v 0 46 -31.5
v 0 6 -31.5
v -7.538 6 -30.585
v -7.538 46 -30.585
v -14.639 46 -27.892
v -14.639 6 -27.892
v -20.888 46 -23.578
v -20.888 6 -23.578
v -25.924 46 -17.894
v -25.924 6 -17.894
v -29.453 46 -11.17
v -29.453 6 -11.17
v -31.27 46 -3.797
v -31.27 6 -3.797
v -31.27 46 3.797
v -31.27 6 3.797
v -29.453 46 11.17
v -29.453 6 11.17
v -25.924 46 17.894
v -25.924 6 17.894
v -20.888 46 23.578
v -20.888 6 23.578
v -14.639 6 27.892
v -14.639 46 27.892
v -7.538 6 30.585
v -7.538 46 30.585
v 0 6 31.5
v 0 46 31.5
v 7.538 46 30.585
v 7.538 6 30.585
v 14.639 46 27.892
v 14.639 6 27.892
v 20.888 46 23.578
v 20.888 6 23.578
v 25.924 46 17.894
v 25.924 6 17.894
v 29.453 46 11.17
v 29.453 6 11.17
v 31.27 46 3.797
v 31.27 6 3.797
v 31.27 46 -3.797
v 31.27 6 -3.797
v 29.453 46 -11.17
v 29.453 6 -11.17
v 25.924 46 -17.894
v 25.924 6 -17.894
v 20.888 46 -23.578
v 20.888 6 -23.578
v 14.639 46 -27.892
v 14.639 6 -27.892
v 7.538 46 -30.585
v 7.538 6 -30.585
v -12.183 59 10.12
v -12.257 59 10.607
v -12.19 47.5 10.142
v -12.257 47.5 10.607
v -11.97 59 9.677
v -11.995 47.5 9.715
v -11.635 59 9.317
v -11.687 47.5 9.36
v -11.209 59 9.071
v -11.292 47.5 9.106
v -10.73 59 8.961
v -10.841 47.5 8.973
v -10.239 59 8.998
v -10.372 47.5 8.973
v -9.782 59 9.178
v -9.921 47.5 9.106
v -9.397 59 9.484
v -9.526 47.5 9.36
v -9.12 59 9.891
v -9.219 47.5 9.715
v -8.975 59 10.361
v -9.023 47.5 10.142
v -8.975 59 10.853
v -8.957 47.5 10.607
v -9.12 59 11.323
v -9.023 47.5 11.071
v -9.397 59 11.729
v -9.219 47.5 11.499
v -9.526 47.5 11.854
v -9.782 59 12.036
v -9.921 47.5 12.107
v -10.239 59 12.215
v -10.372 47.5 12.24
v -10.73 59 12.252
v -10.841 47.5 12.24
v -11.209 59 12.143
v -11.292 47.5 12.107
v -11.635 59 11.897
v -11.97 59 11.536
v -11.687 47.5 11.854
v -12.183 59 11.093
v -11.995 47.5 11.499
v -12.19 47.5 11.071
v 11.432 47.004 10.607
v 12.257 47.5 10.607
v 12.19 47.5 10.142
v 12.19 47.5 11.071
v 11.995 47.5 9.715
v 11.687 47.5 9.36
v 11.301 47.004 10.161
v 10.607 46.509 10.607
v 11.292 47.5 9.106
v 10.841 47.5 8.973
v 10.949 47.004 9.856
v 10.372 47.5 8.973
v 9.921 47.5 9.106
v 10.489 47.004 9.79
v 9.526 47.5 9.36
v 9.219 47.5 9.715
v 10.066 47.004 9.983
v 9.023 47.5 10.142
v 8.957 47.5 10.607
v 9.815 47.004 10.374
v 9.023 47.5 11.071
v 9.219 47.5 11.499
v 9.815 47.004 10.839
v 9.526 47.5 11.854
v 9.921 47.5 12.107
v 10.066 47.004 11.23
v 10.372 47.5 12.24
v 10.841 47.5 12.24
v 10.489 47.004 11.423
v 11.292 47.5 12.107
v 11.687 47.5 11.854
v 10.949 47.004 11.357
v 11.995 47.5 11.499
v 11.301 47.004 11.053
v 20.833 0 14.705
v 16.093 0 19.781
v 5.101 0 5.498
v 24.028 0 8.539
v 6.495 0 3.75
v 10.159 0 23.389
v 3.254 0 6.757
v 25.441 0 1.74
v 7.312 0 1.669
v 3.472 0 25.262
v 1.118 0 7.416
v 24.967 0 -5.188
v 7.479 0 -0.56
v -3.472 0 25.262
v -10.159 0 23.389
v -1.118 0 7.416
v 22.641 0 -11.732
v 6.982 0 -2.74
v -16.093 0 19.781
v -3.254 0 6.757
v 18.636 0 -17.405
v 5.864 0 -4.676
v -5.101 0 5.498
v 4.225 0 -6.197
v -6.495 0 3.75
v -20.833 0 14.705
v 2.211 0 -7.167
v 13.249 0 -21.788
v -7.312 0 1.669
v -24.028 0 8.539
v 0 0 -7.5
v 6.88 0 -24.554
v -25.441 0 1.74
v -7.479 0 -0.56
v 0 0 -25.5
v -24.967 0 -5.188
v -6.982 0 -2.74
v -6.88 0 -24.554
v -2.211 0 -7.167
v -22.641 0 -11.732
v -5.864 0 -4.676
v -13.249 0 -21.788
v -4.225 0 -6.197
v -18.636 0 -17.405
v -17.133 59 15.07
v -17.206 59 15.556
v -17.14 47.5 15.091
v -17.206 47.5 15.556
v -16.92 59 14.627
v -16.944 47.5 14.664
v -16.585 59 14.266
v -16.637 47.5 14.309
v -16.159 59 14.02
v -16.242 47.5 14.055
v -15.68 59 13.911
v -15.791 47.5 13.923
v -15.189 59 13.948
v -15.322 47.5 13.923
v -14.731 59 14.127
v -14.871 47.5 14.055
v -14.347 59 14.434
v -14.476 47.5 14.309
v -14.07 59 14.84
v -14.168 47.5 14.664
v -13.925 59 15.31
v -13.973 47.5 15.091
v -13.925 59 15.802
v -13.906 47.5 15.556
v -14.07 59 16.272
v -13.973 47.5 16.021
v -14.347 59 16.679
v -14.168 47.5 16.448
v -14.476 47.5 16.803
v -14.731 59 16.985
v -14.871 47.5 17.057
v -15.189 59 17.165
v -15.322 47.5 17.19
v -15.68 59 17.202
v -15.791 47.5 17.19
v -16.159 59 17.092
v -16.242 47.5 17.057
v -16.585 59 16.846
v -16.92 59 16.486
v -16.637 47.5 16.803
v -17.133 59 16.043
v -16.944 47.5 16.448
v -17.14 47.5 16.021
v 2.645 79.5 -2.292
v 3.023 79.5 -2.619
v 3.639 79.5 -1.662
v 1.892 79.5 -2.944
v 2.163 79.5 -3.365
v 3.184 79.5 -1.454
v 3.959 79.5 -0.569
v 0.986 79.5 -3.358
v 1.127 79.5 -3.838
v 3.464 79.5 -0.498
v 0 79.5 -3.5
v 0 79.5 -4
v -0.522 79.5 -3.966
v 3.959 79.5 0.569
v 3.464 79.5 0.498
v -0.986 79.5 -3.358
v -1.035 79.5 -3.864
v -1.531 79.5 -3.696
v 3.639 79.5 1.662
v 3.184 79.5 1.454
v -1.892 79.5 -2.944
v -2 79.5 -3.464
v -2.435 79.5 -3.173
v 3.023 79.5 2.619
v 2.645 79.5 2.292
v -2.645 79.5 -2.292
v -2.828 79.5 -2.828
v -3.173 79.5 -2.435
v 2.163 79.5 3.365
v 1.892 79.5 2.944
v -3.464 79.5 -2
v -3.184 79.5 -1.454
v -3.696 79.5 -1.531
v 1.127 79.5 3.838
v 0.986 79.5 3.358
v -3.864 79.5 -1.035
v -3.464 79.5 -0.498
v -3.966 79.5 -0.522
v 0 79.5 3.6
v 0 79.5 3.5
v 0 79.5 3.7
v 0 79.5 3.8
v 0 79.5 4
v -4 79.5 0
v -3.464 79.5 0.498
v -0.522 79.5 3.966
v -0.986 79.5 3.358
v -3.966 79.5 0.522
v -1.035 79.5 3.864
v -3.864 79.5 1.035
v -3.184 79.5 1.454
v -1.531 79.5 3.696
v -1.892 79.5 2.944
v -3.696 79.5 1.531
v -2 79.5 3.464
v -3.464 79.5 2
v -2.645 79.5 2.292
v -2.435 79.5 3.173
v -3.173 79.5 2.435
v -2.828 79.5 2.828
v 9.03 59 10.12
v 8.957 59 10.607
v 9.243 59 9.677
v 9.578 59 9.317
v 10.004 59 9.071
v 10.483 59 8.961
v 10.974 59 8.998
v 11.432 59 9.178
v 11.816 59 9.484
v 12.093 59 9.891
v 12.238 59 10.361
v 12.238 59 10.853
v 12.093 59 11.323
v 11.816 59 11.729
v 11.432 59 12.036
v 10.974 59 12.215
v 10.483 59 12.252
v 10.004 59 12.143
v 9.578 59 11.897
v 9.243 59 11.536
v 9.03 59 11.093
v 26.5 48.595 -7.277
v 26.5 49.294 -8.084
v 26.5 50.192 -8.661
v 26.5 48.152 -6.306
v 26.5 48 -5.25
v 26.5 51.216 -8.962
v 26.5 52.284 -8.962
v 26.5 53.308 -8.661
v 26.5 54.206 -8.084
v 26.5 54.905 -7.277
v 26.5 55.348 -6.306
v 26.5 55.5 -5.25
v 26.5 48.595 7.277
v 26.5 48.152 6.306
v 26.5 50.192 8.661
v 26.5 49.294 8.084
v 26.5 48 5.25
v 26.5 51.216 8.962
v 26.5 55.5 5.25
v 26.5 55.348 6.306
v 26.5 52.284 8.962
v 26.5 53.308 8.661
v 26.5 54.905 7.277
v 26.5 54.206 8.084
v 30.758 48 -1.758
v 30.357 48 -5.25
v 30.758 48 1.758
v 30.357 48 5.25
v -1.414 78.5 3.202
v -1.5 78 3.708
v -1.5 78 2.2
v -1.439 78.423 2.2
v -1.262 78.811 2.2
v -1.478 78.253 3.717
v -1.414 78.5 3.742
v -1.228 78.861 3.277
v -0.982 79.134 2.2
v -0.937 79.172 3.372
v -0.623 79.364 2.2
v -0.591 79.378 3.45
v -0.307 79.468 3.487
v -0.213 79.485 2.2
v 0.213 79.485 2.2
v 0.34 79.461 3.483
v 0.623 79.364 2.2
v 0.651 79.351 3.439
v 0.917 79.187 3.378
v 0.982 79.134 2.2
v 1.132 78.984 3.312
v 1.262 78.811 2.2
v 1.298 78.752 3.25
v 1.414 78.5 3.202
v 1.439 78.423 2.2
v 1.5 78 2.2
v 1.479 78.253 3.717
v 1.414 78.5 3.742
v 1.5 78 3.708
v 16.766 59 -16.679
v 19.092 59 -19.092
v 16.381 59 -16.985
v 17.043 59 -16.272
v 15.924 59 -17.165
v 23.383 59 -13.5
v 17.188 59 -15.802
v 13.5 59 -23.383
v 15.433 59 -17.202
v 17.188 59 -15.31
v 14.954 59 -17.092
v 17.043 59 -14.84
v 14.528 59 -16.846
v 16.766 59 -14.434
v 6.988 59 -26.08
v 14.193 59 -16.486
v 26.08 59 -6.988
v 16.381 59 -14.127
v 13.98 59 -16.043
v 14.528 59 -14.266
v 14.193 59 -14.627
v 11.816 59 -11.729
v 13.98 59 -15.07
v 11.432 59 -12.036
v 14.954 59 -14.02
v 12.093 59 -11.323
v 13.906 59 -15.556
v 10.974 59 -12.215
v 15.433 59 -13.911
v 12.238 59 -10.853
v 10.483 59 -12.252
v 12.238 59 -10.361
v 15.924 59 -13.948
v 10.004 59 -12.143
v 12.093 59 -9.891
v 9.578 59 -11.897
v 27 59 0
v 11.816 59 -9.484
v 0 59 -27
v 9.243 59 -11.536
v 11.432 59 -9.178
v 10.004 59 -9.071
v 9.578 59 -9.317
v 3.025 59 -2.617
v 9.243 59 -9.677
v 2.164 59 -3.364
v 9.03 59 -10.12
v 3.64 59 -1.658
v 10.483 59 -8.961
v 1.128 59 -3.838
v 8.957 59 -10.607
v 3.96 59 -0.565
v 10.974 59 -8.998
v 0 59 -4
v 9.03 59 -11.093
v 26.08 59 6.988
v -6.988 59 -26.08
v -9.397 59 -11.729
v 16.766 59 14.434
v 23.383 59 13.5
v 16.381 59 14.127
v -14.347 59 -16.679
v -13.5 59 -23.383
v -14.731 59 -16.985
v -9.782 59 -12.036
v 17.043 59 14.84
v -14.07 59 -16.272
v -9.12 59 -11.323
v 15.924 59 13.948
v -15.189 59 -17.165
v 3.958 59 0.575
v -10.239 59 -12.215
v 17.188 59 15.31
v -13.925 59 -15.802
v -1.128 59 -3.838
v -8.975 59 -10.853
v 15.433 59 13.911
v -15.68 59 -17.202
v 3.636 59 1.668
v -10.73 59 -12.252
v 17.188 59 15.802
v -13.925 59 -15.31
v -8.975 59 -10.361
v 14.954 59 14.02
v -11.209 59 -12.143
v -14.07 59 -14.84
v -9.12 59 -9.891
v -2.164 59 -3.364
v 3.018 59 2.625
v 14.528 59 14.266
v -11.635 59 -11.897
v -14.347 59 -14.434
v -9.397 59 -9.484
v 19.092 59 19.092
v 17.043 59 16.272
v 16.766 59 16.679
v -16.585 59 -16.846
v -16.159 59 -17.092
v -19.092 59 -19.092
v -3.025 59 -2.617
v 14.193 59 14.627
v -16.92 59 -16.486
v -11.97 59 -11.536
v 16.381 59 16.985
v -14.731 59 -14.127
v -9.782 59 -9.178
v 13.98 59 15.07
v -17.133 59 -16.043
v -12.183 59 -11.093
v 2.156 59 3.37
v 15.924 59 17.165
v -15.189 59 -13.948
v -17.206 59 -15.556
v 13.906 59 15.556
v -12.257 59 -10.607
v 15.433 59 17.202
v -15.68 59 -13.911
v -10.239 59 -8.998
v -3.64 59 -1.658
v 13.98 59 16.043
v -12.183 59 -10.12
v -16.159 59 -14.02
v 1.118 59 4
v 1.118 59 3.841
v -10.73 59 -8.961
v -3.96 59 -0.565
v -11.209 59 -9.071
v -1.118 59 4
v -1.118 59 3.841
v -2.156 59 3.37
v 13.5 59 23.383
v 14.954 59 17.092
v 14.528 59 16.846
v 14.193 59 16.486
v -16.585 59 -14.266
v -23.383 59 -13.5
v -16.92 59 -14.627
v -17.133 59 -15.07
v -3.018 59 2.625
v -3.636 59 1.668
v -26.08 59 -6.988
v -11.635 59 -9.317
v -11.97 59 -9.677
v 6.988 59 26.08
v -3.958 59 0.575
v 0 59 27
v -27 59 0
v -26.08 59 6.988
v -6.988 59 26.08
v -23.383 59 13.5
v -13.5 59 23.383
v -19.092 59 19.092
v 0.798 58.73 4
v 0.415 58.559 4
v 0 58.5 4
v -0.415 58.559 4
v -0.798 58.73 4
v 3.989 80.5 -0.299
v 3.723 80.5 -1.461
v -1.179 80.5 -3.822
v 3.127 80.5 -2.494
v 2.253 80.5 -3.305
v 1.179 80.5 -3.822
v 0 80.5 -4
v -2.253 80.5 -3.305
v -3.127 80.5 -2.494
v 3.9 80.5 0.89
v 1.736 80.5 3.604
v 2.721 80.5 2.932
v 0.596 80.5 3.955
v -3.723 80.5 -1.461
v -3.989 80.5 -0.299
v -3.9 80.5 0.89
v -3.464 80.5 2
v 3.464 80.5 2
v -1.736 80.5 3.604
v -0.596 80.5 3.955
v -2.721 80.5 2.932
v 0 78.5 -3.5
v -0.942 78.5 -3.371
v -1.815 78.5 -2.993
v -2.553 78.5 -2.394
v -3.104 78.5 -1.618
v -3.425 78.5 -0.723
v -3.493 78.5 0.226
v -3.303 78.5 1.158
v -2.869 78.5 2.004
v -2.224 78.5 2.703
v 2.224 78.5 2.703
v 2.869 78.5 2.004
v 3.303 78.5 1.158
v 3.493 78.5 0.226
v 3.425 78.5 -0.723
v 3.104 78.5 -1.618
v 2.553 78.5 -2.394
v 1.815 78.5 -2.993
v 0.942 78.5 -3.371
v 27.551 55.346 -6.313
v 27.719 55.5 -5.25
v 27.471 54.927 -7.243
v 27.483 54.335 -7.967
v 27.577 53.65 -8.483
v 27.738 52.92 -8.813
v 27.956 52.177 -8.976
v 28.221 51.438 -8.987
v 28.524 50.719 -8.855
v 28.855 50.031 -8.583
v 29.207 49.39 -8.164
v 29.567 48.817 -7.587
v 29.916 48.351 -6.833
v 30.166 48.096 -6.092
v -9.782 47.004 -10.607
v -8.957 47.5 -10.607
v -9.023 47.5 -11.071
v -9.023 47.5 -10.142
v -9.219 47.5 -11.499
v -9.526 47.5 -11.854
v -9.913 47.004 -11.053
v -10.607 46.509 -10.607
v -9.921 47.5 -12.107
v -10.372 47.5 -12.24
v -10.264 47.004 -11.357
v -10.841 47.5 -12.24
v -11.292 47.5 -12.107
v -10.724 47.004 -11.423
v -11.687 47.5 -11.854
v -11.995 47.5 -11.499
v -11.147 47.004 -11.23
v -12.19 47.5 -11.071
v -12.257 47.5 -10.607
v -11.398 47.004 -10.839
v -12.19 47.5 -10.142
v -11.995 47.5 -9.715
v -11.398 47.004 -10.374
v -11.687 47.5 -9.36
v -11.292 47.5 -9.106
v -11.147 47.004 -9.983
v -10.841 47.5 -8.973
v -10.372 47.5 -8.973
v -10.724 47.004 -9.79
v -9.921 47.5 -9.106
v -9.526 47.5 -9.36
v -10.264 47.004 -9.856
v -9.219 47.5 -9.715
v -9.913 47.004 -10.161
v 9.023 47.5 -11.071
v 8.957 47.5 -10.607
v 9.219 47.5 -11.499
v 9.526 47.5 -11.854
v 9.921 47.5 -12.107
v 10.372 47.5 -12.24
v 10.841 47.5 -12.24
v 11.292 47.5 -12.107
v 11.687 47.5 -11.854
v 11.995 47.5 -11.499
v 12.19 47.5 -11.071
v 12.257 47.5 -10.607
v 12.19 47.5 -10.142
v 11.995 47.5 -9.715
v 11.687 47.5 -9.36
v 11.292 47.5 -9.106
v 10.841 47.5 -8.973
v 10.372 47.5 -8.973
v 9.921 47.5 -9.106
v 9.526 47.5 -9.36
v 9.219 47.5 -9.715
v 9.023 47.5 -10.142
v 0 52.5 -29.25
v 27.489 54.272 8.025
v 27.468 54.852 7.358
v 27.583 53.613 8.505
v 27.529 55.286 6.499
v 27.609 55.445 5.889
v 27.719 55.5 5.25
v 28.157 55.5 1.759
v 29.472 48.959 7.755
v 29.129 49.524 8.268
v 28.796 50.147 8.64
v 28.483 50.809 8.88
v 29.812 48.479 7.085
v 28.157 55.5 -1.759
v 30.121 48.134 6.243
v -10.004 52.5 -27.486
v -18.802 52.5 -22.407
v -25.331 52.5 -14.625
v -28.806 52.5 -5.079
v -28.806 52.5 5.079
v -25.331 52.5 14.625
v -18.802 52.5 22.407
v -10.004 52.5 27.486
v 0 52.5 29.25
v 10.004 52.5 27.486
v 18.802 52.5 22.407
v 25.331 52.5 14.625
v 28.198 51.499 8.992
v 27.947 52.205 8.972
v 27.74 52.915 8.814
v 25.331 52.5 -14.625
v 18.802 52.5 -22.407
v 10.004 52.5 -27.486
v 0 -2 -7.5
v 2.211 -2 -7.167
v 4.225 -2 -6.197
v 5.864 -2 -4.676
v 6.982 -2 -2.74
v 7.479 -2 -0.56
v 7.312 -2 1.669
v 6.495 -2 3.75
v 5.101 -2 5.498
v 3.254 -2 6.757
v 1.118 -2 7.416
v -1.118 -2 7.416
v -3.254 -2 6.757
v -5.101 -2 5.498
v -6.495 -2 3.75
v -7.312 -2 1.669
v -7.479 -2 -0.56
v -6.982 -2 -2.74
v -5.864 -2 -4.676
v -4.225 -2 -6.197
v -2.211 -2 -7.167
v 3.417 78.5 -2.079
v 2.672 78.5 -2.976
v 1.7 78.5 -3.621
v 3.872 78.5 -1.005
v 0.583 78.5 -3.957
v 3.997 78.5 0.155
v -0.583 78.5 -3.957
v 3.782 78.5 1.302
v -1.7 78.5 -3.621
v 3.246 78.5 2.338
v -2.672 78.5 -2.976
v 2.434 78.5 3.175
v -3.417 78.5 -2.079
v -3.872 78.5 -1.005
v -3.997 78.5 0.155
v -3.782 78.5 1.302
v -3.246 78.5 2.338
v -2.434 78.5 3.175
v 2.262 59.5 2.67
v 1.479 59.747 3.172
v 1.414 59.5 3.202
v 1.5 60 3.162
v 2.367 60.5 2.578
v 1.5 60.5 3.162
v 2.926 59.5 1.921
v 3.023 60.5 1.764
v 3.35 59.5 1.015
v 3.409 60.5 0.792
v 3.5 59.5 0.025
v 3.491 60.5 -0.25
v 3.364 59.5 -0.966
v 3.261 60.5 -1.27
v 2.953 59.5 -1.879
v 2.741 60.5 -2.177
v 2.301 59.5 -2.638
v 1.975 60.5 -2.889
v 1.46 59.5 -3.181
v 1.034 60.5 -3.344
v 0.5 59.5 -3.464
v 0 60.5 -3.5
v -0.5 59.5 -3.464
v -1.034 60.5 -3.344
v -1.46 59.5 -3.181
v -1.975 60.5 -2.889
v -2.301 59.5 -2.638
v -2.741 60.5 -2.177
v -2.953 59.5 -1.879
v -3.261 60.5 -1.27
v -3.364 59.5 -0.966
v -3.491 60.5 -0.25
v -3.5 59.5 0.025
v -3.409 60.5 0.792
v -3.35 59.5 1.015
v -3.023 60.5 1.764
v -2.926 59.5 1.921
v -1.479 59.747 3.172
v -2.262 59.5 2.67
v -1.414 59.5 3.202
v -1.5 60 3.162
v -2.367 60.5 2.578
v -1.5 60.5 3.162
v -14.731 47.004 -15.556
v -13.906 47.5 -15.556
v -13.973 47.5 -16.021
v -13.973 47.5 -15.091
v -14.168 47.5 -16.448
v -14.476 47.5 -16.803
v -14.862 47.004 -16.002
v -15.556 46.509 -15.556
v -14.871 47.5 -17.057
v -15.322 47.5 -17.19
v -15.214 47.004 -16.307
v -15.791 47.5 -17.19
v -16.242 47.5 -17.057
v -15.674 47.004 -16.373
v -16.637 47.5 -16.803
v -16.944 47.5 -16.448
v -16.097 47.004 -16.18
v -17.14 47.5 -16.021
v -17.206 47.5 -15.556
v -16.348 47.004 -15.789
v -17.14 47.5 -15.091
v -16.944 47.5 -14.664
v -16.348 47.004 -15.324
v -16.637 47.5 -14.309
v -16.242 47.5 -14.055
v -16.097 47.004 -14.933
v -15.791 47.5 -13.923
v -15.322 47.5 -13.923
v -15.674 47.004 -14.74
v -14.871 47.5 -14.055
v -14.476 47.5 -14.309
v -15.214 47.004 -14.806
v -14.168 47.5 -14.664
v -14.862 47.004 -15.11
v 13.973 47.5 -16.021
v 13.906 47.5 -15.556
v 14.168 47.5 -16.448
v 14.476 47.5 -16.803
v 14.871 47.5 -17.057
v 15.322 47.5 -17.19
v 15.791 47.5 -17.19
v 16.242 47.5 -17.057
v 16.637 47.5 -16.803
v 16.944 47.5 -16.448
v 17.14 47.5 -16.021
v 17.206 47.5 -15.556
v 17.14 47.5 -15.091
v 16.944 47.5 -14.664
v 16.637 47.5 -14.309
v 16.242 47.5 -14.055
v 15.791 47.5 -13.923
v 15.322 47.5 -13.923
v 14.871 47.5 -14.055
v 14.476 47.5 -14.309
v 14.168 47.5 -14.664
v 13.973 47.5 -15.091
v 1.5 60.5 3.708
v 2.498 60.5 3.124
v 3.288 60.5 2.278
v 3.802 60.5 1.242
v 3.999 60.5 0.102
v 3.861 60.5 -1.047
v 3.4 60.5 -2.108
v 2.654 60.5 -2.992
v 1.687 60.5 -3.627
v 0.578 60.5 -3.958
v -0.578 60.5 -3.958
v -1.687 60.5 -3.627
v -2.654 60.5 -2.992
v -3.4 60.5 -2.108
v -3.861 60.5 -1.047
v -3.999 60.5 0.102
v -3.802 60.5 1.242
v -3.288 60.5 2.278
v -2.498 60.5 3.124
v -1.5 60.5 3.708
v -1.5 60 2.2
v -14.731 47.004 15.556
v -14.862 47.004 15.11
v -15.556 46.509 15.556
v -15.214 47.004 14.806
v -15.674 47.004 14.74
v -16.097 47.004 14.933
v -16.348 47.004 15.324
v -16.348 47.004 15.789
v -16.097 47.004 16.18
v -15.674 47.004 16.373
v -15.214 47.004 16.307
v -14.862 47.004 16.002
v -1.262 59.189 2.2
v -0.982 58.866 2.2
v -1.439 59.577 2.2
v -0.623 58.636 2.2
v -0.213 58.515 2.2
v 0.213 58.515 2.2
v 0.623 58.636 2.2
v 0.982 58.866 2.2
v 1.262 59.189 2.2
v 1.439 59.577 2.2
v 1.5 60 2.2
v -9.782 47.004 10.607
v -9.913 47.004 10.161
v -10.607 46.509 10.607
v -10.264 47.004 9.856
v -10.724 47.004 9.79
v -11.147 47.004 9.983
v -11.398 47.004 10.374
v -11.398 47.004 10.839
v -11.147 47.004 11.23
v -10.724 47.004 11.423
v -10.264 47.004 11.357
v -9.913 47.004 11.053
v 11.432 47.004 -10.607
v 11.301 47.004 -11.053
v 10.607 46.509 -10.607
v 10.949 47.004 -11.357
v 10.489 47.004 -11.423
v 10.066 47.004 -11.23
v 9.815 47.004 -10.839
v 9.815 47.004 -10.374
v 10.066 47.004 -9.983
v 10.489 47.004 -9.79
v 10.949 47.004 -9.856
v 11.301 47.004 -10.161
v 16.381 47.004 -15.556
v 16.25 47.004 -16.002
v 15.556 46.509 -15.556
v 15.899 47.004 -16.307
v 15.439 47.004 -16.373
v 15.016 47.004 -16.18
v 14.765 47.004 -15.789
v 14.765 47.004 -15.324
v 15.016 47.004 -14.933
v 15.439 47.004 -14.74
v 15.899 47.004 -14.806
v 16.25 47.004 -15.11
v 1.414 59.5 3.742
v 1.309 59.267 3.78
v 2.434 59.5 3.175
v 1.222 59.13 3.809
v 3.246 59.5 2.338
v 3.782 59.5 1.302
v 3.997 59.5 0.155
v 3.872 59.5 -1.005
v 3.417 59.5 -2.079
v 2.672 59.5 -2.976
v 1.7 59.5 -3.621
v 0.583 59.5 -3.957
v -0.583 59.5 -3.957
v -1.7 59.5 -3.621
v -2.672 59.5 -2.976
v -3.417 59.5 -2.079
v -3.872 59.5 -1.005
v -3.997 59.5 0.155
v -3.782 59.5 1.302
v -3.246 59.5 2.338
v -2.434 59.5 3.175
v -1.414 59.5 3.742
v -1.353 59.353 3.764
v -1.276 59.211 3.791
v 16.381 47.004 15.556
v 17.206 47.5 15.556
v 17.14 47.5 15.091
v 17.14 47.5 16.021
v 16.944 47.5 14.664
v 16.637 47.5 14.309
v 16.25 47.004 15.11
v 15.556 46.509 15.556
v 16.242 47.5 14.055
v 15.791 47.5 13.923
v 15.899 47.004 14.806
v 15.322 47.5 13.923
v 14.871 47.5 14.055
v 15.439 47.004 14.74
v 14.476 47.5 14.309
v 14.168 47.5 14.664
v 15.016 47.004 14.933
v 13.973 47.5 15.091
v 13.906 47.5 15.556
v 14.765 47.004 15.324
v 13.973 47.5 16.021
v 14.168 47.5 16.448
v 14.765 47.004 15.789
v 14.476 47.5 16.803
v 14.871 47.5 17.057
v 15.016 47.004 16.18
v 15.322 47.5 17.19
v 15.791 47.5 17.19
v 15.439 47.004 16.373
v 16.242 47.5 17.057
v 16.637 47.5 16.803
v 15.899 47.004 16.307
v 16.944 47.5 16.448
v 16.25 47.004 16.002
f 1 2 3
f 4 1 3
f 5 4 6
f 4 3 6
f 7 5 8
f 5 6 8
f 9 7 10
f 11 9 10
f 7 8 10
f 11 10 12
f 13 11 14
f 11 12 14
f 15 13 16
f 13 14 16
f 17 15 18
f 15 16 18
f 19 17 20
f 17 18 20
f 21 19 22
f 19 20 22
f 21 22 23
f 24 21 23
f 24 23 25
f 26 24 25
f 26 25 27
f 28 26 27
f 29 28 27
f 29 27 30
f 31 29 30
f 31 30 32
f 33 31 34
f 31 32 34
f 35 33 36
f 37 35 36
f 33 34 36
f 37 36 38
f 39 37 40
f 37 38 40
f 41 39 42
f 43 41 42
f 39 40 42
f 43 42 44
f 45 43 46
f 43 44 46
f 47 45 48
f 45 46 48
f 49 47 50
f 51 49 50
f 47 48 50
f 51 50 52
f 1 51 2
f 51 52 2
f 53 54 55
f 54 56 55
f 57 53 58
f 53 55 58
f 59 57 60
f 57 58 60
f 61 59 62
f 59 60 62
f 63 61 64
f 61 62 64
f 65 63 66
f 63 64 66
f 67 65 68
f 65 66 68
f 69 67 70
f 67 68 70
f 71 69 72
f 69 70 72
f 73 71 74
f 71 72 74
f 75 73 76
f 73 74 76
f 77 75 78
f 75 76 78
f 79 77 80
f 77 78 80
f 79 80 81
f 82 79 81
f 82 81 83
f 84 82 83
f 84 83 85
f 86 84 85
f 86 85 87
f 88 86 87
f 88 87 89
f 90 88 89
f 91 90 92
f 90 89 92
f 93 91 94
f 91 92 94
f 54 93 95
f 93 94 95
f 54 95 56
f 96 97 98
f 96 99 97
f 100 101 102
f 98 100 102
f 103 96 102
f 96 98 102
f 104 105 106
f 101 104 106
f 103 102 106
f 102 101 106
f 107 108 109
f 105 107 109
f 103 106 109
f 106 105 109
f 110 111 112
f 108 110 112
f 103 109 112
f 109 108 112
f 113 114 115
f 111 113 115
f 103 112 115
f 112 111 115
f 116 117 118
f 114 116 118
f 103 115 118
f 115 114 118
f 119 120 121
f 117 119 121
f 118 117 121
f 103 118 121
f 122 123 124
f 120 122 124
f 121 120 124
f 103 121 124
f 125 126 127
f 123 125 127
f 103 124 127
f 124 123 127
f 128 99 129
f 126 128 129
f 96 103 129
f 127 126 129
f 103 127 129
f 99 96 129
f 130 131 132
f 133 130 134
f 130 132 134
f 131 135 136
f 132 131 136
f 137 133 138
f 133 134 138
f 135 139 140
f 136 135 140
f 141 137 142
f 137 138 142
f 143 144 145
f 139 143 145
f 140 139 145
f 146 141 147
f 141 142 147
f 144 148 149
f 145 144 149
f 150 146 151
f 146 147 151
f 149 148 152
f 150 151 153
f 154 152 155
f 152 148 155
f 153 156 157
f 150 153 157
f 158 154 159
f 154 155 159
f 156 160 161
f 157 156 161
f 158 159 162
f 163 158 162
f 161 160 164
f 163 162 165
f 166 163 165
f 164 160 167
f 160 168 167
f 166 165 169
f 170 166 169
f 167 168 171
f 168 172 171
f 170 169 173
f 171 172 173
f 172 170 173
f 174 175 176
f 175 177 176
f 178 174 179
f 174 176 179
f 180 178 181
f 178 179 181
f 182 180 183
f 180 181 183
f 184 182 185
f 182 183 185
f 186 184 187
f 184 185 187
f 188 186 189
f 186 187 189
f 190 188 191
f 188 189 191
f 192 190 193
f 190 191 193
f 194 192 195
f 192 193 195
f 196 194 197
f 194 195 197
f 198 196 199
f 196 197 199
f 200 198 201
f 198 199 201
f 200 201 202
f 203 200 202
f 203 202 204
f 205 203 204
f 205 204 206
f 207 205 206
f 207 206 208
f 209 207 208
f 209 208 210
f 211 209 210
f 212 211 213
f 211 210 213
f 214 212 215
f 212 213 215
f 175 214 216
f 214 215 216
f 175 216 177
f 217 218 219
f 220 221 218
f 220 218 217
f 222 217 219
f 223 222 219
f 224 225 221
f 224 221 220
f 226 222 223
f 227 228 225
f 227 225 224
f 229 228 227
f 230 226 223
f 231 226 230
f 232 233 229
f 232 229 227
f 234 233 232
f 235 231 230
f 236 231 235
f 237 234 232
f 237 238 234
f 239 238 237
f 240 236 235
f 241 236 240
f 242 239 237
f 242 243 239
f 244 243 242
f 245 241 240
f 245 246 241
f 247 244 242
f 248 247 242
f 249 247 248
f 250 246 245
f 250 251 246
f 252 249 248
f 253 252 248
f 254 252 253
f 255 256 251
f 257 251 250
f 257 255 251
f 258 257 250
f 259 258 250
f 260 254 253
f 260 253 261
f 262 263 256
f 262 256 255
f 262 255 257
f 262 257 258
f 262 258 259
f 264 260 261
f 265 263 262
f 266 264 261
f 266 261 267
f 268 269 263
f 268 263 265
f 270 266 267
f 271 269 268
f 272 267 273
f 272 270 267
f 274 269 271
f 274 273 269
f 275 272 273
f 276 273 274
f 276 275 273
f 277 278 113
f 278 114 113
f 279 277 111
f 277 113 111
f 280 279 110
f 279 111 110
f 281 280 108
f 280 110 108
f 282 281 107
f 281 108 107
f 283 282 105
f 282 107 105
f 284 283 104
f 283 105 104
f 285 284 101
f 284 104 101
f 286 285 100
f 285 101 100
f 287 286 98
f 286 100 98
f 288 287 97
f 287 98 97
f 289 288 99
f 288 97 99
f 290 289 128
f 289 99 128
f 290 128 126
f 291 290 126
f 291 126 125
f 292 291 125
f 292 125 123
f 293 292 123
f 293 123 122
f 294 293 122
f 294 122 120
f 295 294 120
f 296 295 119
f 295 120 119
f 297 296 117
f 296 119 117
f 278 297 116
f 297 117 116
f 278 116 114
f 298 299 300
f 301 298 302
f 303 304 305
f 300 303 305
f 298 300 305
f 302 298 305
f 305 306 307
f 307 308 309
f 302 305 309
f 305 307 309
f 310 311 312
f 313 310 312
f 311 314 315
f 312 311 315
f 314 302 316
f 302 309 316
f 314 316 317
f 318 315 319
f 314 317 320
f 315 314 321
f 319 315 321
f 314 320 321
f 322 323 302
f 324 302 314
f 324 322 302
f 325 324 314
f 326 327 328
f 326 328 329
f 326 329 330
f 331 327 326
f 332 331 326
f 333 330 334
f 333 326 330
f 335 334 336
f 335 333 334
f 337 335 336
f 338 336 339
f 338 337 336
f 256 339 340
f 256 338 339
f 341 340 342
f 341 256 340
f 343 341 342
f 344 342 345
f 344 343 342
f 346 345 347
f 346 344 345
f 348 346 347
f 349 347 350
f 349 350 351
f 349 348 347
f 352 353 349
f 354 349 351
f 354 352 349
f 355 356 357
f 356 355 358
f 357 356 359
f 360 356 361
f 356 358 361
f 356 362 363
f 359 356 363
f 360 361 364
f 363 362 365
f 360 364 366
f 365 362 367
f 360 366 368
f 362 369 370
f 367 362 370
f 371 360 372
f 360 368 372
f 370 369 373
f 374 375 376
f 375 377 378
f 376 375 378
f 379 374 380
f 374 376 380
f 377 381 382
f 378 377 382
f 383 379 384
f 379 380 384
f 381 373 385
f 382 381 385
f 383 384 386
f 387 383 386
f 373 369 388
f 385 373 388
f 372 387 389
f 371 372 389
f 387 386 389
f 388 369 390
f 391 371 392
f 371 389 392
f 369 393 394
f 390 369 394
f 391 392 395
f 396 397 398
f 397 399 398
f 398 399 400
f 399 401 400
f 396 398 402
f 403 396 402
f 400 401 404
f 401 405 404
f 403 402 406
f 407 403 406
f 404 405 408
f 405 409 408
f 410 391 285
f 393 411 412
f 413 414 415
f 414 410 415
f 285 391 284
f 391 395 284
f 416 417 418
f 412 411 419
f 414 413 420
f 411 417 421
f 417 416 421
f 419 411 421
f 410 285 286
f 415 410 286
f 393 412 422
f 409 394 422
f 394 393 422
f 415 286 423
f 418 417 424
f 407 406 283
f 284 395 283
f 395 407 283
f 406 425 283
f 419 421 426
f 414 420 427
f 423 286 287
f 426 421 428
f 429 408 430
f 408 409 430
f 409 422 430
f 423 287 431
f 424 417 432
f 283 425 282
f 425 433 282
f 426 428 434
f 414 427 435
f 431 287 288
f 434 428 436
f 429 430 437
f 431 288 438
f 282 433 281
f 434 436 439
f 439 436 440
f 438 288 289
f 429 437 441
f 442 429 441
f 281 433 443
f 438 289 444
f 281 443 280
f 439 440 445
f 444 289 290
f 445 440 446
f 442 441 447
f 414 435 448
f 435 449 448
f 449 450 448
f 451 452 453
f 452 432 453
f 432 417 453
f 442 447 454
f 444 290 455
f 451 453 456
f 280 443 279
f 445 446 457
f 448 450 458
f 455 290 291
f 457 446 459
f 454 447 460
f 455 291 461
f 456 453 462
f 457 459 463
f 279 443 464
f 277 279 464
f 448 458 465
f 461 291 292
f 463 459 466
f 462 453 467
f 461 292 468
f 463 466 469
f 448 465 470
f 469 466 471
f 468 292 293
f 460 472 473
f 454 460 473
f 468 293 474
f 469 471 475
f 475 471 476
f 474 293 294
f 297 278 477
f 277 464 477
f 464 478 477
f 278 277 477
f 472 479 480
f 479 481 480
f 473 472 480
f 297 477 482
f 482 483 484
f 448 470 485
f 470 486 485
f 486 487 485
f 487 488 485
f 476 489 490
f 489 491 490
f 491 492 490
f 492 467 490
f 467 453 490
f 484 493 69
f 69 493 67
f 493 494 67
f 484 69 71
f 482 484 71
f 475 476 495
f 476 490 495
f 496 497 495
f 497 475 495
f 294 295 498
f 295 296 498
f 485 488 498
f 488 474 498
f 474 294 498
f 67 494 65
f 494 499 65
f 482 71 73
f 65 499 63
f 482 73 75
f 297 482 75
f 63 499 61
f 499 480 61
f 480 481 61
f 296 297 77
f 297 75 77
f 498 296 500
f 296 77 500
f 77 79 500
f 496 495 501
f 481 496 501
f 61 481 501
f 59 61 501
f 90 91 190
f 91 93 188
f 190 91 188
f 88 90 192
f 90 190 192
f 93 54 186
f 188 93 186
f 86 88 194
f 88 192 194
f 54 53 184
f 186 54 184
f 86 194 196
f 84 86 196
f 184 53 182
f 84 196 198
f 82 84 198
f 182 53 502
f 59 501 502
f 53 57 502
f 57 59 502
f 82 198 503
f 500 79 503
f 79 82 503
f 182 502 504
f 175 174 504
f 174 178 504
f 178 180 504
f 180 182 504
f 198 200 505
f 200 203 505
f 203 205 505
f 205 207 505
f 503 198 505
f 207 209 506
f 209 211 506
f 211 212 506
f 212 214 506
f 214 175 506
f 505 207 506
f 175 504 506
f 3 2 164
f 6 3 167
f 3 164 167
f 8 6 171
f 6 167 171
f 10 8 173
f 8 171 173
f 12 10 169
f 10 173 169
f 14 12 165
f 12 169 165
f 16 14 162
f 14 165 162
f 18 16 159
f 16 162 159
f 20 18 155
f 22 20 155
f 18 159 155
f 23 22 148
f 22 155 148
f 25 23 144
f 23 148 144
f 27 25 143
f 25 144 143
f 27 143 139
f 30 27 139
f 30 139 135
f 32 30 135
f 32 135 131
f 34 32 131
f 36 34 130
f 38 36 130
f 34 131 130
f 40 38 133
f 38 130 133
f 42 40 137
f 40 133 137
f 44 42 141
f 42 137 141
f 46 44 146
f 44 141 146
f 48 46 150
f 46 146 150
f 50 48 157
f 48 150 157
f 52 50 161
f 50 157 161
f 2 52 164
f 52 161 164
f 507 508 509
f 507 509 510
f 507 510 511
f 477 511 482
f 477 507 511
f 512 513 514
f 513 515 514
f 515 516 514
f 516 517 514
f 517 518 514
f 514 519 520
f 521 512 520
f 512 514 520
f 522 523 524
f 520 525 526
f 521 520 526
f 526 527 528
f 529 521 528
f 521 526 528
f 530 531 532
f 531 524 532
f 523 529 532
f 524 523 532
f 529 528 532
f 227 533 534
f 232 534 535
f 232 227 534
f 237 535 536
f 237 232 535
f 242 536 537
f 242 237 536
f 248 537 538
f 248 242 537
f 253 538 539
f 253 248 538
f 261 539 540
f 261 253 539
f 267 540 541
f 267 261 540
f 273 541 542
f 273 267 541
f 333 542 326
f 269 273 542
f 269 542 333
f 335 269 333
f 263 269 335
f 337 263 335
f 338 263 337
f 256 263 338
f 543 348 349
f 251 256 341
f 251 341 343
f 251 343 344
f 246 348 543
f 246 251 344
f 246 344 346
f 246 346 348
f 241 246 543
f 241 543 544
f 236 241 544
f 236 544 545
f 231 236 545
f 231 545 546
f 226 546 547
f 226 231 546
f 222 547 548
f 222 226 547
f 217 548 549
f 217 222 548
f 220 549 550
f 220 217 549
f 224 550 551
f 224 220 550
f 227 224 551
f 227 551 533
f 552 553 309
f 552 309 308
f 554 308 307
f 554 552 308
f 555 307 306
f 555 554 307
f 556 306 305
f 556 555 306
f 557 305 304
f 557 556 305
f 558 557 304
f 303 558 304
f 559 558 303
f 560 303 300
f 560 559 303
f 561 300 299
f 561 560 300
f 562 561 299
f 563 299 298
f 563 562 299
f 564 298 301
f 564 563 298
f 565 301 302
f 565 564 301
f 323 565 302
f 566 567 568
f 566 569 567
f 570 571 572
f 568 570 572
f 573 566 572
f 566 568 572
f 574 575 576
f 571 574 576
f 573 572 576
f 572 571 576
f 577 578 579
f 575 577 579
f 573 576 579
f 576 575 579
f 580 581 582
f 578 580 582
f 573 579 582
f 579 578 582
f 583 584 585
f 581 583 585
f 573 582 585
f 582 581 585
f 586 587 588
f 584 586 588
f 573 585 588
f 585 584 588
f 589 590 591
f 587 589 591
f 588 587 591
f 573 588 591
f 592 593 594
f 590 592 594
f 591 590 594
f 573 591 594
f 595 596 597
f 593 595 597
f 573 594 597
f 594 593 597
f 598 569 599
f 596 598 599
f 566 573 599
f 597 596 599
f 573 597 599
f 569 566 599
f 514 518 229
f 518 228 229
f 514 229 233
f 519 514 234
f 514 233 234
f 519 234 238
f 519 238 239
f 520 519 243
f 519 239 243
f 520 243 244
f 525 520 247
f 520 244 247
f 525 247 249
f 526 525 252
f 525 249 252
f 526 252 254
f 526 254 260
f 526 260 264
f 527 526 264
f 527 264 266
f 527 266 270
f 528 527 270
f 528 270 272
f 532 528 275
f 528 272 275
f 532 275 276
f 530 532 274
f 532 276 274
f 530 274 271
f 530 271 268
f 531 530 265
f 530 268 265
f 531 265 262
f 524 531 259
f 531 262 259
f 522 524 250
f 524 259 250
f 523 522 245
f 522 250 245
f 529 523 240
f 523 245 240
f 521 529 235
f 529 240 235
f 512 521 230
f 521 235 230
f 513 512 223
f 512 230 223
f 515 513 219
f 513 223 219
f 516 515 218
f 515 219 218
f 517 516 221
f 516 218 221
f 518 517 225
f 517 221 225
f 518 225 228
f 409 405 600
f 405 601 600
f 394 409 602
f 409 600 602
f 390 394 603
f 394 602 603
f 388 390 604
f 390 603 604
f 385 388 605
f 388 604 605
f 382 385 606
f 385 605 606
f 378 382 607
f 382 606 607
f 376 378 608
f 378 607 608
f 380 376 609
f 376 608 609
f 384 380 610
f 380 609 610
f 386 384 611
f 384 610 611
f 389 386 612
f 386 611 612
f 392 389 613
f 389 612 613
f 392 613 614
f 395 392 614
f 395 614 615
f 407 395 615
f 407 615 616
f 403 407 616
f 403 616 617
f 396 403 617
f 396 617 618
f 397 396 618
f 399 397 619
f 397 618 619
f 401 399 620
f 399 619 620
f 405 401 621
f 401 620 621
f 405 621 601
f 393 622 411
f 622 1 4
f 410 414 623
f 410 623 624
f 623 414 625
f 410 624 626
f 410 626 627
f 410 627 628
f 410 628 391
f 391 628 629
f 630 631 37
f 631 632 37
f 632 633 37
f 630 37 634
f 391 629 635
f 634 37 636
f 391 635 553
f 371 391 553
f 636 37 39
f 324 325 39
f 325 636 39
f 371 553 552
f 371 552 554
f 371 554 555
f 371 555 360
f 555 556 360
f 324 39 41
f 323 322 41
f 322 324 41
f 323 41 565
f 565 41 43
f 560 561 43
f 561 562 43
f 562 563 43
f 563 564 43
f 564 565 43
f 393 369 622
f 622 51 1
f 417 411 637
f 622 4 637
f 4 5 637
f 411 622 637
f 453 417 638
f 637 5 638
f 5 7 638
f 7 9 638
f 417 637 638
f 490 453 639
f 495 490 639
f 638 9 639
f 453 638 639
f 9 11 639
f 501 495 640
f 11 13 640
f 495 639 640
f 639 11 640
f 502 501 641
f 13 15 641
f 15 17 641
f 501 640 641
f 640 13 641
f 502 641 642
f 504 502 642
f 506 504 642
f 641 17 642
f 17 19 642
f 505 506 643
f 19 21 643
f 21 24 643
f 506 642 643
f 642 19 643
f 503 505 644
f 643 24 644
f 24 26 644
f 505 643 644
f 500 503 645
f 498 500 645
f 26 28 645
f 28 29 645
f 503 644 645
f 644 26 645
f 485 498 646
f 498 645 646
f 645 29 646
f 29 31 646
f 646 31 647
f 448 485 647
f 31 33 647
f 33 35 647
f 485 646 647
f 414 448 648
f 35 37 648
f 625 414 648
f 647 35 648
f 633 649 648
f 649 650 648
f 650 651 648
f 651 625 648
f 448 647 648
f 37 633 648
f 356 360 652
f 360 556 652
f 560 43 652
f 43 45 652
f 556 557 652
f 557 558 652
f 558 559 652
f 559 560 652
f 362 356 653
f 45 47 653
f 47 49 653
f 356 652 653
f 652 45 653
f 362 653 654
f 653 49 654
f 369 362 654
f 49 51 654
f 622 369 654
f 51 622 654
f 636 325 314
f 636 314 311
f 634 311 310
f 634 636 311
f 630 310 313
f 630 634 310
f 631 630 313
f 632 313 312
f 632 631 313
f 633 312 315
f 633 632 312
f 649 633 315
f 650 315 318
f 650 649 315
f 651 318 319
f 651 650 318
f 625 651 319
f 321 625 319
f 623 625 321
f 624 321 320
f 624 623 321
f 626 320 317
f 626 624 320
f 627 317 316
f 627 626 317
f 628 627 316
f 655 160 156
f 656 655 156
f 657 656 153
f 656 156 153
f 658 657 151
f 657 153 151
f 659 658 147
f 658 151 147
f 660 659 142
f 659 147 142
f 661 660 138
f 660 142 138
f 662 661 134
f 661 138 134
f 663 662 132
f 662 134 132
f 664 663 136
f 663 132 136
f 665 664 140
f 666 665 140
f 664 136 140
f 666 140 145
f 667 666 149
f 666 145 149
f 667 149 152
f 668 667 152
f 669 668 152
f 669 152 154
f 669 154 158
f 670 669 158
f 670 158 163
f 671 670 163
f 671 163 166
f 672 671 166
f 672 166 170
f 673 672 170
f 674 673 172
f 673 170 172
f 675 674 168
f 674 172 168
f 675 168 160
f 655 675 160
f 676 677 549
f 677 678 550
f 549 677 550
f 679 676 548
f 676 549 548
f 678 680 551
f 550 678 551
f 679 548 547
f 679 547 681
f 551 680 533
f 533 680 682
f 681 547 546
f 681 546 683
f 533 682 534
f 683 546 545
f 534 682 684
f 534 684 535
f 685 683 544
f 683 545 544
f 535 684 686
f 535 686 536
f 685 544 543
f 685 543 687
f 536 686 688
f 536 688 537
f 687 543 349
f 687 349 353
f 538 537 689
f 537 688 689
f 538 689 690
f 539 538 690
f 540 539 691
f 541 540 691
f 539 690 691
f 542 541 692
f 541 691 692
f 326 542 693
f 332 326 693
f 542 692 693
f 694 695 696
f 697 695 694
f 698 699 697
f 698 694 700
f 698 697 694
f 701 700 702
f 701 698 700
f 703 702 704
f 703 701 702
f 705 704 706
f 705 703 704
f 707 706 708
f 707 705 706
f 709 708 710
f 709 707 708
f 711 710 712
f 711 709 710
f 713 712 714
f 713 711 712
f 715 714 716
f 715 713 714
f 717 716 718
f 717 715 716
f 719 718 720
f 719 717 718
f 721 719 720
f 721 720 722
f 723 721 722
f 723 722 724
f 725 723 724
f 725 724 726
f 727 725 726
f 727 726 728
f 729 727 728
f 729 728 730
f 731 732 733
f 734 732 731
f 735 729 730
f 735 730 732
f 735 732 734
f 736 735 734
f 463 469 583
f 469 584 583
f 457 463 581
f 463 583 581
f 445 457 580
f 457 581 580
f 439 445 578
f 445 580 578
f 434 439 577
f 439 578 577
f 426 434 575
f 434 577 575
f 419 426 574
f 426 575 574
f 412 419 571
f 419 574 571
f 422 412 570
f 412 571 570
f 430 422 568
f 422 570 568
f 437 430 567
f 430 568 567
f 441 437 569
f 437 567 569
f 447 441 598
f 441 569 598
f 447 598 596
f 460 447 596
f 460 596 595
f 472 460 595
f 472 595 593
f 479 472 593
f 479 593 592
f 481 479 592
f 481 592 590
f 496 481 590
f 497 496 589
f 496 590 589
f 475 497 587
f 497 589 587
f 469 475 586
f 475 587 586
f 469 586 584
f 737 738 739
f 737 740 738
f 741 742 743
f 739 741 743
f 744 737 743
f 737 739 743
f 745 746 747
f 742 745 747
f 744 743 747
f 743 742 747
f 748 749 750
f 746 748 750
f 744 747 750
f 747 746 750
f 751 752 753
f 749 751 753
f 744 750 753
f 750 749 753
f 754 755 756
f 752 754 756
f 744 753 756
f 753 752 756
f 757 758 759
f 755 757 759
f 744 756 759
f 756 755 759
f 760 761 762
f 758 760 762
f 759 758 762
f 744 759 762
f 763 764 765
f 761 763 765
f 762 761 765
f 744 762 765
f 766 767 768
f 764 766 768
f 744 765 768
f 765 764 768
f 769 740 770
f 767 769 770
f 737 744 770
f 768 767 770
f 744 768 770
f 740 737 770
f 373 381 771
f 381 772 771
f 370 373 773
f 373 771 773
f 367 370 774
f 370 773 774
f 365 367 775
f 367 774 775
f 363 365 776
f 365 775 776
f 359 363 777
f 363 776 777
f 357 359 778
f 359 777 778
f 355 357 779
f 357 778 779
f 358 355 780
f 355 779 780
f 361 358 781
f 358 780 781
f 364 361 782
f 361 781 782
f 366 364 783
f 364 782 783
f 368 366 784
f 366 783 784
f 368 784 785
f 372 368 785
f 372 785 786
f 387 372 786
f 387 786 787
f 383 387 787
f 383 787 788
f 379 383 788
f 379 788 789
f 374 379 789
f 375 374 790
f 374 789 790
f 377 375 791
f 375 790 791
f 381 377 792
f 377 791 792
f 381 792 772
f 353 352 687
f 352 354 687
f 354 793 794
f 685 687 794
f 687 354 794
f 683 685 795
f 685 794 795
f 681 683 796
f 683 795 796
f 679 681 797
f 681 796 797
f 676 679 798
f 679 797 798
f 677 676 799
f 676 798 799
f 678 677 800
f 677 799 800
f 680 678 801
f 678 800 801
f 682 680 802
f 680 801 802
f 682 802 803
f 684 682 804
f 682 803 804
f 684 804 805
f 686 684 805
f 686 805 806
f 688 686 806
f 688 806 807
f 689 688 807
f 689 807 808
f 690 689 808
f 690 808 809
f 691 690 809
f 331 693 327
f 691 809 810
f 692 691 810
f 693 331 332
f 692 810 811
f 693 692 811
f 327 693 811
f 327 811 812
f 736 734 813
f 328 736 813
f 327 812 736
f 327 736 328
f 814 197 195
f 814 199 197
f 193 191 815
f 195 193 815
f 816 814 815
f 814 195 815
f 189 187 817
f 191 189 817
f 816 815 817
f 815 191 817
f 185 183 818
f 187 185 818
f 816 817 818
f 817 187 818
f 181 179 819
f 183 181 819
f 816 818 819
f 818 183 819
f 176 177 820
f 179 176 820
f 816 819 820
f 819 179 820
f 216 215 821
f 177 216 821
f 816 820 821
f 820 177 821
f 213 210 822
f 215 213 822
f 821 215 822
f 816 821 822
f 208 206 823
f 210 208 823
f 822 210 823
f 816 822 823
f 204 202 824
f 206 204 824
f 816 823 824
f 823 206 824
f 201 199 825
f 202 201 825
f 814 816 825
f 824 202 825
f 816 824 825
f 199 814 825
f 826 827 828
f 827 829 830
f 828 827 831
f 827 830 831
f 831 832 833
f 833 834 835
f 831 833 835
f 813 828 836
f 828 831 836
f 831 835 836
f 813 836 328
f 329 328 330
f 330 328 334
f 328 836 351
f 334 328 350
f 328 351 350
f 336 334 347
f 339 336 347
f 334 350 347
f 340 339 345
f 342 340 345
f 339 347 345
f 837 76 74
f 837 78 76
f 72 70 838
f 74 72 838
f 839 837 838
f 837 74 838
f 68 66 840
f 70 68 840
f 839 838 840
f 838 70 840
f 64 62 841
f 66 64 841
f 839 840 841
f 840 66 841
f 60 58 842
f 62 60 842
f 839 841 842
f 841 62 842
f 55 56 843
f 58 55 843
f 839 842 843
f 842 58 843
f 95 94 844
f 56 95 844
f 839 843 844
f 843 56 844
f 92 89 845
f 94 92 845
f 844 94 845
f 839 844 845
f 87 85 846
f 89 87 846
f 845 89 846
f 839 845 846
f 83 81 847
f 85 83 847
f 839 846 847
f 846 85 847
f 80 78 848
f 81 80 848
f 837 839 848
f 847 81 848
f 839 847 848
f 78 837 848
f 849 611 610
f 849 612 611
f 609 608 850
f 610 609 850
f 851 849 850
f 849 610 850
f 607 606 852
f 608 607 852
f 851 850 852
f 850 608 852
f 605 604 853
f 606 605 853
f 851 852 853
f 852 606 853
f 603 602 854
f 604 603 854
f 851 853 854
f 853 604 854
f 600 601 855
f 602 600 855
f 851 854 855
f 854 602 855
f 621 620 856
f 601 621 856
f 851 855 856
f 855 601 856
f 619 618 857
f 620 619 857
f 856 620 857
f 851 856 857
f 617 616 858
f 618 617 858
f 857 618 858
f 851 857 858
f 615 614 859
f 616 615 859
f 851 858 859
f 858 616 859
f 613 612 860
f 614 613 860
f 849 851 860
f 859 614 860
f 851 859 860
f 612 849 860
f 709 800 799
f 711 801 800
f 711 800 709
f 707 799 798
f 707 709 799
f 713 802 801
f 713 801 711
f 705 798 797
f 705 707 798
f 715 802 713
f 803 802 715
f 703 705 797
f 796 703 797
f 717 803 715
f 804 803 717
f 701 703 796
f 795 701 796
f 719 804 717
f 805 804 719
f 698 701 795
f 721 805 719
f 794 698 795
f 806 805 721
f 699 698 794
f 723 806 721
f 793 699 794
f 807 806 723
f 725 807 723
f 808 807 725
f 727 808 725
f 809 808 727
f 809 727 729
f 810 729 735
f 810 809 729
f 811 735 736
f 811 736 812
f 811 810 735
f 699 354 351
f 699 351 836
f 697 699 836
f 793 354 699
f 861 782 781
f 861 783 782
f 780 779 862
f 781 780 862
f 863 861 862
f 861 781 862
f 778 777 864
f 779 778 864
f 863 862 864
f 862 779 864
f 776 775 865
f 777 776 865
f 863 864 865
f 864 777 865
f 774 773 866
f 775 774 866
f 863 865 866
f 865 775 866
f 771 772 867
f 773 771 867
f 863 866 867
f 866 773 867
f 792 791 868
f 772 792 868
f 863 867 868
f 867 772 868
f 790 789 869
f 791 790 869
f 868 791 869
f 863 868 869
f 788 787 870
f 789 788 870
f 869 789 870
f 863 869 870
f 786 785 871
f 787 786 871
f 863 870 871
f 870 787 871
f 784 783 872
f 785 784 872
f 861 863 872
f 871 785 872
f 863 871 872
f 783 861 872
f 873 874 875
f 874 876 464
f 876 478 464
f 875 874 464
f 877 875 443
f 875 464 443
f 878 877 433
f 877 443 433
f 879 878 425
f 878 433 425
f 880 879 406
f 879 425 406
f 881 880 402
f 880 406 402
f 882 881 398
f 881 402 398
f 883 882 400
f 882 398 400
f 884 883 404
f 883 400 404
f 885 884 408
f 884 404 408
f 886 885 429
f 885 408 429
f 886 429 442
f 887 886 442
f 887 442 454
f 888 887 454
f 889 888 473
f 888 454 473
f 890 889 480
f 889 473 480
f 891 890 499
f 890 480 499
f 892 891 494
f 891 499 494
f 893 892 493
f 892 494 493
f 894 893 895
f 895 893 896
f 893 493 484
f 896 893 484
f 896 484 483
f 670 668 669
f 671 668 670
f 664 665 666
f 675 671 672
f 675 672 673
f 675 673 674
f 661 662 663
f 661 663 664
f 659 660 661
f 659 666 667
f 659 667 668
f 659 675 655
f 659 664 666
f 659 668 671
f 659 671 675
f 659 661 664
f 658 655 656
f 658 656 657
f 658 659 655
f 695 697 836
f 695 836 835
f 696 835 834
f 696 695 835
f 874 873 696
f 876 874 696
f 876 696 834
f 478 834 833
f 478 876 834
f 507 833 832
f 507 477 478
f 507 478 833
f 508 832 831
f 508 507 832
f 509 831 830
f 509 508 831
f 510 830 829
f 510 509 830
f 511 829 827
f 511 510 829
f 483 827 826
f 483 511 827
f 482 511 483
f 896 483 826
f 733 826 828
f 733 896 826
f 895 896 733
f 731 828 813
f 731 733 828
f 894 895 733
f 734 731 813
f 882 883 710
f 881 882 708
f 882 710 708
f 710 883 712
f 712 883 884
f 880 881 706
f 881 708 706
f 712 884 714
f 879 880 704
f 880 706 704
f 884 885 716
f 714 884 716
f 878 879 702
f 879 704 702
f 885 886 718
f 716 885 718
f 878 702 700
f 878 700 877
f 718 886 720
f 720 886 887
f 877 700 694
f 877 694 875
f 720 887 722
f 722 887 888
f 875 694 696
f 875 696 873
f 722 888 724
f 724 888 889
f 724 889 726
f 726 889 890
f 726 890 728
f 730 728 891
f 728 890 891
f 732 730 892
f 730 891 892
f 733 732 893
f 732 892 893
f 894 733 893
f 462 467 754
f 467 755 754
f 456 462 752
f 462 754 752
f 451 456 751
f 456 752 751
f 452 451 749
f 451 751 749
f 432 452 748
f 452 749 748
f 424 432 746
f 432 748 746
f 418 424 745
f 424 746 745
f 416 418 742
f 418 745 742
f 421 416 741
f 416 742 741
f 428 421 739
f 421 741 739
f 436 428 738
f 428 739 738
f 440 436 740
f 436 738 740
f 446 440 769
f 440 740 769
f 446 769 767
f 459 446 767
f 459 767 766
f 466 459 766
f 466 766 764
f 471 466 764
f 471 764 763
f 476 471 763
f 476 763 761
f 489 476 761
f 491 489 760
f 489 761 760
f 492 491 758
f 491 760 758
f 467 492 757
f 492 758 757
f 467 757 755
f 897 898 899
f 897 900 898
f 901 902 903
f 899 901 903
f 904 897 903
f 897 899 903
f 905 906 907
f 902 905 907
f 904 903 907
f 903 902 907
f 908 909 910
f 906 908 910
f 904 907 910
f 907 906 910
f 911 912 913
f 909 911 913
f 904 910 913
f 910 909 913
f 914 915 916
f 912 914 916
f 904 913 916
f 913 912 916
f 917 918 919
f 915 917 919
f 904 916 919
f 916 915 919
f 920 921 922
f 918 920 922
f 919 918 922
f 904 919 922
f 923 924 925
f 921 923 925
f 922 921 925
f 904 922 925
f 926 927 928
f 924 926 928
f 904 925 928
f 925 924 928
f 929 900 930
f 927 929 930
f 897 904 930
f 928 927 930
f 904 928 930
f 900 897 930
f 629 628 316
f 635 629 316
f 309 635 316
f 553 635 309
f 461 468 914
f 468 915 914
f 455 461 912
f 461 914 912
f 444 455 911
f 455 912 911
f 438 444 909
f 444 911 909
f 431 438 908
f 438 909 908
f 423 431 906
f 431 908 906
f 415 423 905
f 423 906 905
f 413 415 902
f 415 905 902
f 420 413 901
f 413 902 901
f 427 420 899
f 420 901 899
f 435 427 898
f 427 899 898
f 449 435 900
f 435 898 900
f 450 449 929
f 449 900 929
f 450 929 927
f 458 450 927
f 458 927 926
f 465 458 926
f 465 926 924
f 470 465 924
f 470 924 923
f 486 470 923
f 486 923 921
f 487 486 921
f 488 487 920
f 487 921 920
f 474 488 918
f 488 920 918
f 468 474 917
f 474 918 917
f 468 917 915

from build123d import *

# Parameters (mm, degrees)
M4X0_7_1_D          = 3.3
M4X0_7_1_DEPTH      = 11.5
M4X0_7_1_TIP        = 0.991420021
CUT_EXTRUDE1_DEPTH  = 1.8
CHAMFER_1_SIZE      = 4.5
CHAMFER_1_SIZE2     = 13
CHAMFER_2_SIZE      = 6
SKETCH_6_R          = 7.5
EXTRUDE_1_DEPTH     = 2
SKETCH_7_W          = 0.5
SKETCH_7_H          = 1
CUT_EXTRUDE_START   = 31.5
CUT_EXTRUDE_1_DEPTH = 5


with BuildPart() as part:
    # 스케치1 → 회전1 (revolve)
    with BuildSketch(Plane.XY, mode=Mode.PRIVATE) as revolve_1_sk:
        Polygon((0, 80.5), (4, 80.5), (4, 59), (31.5, 59), (31.5, 0), (0, 0), align=None)
    revolve(revolve_1_sk.sketch.rotate(Axis((0, 0, 0), (0, 1, 0)), 90), axis=Axis((0, 0, 0), (0, 1, 0)))

    # M4x0.7 나사 구멍1
    with Locations(Plane(origin=(0, 59, 0), x_dir=(1, 0, 0), z_dir=(0, 1, 0))):
        with Locations((10.606601718, 10.606601718), (15.556349186, 15.556349186), (10.606601718, -10.606601718), (15.556349186, -15.556349186), (-10.606601718, -10.606601718), (-15.556349186, -15.556349186), (-10.606601718, 10.606601718), (-15.556349186, 15.556349186)):
            Hole(M4X0_7_1_D / 2, depth=M4X0_7_1_DEPTH)
            with Locations((0, 0, -(M4X0_7_1_DEPTH + M4X0_7_1_TIP / 2))):  # 118° drill point
                Cone(0, M4X0_7_1_D / 2, M4X0_7_1_TIP, mode=Mode.SUBTRACT)

    # Sketch3 → Cut-Extrude1 (cut)
    with BuildSketch(Plane(origin=(2.845698698, 80.5, 4), x_dir=(0, 1, 0), z_dir=(0, 0, -1))):
        with BuildLine():
            Line((-2.5, -1.345698698), (-20.5, -1.345698698))
            ThreePointArc((-20.5, -1.345698698), (-22, -2.845698698), (-20.5, -4.345698698))
            Line((-20.5, -4.345698698), (-2.5, -4.345698698))
            ThreePointArc((-2.5, -4.345698698), (-1, -2.845698698), (-2.5, -1.345698698))
        make_face()
    extrude(amount=CUT_EXTRUDE1_DEPTH, mode=Mode.SUBTRACT)

    # 모따기1
    chamfer_1_edges = [part.edges().sort_by_distance(p)[0] for p in [
        (0, 59, 31.5),
    ]]
    chamfer_1_side = [part.faces().sort_by_distance(p)[0] for p in [
        (0, 59, 30.609045456),
    ]]
    chamfer(chamfer_1_edges, length=CHAMFER_1_SIZE, length2=CHAMFER_1_SIZE2, reference=chamfer_1_side[0])

    # 모따기2
    chamfer_2_edges = [part.edges().sort_by_distance(p)[0] for p in [
        (0, 0, 31.5),
    ]]
    chamfer(chamfer_2_edges, length=CHAMFER_2_SIZE)

    # 스케치6 → 보스-돌출1 (add)
    with BuildSketch(Plane.XZ):
        with Locations(Location((0, 0, 0), (0, 0, 270))):
            Circle(SKETCH_6_R)
    extrude(amount=EXTRUDE_1_DEPTH)

    # 스케치7 → 컷-회전1 (revolve, cut)
    with BuildSketch(Plane(origin=(0, 0, 0), x_dir=(0, 0, -1), z_dir=(1, 0, 0))):
        with Locations((3.75, 79)):
            Rectangle(SKETCH_7_W, SKETCH_7_H)
        with Locations((3.75, 60)):
            Rectangle(SKETCH_7_W, SKETCH_7_H)
    revolve(axis=Axis((0, 0, 0), (0, 1, 0)), mode=Mode.SUBTRACT)

    # 스케치9 → 컷-돌출1 (cut)
    with BuildSketch(Plane(origin=(0, 0, 0), x_dir=(0, 0, -1), z_dir=(1, 0, 0)).offset(CUT_EXTRUDE_START)):
        with BuildLine():
            Line((5.25, 48), (-5.25, 48))
            ThreePointArc((-5.25, 48), (-9, 51.75), (-5.25, 55.5))
            Line((-5.25, 55.5), (5.25, 55.5))
            ThreePointArc((5.25, 55.5), (9, 51.75), (5.25, 48))
        make_face()
    extrude(amount=-CUT_EXTRUDE_1_DEPTH, mode=Mode.SUBTRACT)


solid = part.part
